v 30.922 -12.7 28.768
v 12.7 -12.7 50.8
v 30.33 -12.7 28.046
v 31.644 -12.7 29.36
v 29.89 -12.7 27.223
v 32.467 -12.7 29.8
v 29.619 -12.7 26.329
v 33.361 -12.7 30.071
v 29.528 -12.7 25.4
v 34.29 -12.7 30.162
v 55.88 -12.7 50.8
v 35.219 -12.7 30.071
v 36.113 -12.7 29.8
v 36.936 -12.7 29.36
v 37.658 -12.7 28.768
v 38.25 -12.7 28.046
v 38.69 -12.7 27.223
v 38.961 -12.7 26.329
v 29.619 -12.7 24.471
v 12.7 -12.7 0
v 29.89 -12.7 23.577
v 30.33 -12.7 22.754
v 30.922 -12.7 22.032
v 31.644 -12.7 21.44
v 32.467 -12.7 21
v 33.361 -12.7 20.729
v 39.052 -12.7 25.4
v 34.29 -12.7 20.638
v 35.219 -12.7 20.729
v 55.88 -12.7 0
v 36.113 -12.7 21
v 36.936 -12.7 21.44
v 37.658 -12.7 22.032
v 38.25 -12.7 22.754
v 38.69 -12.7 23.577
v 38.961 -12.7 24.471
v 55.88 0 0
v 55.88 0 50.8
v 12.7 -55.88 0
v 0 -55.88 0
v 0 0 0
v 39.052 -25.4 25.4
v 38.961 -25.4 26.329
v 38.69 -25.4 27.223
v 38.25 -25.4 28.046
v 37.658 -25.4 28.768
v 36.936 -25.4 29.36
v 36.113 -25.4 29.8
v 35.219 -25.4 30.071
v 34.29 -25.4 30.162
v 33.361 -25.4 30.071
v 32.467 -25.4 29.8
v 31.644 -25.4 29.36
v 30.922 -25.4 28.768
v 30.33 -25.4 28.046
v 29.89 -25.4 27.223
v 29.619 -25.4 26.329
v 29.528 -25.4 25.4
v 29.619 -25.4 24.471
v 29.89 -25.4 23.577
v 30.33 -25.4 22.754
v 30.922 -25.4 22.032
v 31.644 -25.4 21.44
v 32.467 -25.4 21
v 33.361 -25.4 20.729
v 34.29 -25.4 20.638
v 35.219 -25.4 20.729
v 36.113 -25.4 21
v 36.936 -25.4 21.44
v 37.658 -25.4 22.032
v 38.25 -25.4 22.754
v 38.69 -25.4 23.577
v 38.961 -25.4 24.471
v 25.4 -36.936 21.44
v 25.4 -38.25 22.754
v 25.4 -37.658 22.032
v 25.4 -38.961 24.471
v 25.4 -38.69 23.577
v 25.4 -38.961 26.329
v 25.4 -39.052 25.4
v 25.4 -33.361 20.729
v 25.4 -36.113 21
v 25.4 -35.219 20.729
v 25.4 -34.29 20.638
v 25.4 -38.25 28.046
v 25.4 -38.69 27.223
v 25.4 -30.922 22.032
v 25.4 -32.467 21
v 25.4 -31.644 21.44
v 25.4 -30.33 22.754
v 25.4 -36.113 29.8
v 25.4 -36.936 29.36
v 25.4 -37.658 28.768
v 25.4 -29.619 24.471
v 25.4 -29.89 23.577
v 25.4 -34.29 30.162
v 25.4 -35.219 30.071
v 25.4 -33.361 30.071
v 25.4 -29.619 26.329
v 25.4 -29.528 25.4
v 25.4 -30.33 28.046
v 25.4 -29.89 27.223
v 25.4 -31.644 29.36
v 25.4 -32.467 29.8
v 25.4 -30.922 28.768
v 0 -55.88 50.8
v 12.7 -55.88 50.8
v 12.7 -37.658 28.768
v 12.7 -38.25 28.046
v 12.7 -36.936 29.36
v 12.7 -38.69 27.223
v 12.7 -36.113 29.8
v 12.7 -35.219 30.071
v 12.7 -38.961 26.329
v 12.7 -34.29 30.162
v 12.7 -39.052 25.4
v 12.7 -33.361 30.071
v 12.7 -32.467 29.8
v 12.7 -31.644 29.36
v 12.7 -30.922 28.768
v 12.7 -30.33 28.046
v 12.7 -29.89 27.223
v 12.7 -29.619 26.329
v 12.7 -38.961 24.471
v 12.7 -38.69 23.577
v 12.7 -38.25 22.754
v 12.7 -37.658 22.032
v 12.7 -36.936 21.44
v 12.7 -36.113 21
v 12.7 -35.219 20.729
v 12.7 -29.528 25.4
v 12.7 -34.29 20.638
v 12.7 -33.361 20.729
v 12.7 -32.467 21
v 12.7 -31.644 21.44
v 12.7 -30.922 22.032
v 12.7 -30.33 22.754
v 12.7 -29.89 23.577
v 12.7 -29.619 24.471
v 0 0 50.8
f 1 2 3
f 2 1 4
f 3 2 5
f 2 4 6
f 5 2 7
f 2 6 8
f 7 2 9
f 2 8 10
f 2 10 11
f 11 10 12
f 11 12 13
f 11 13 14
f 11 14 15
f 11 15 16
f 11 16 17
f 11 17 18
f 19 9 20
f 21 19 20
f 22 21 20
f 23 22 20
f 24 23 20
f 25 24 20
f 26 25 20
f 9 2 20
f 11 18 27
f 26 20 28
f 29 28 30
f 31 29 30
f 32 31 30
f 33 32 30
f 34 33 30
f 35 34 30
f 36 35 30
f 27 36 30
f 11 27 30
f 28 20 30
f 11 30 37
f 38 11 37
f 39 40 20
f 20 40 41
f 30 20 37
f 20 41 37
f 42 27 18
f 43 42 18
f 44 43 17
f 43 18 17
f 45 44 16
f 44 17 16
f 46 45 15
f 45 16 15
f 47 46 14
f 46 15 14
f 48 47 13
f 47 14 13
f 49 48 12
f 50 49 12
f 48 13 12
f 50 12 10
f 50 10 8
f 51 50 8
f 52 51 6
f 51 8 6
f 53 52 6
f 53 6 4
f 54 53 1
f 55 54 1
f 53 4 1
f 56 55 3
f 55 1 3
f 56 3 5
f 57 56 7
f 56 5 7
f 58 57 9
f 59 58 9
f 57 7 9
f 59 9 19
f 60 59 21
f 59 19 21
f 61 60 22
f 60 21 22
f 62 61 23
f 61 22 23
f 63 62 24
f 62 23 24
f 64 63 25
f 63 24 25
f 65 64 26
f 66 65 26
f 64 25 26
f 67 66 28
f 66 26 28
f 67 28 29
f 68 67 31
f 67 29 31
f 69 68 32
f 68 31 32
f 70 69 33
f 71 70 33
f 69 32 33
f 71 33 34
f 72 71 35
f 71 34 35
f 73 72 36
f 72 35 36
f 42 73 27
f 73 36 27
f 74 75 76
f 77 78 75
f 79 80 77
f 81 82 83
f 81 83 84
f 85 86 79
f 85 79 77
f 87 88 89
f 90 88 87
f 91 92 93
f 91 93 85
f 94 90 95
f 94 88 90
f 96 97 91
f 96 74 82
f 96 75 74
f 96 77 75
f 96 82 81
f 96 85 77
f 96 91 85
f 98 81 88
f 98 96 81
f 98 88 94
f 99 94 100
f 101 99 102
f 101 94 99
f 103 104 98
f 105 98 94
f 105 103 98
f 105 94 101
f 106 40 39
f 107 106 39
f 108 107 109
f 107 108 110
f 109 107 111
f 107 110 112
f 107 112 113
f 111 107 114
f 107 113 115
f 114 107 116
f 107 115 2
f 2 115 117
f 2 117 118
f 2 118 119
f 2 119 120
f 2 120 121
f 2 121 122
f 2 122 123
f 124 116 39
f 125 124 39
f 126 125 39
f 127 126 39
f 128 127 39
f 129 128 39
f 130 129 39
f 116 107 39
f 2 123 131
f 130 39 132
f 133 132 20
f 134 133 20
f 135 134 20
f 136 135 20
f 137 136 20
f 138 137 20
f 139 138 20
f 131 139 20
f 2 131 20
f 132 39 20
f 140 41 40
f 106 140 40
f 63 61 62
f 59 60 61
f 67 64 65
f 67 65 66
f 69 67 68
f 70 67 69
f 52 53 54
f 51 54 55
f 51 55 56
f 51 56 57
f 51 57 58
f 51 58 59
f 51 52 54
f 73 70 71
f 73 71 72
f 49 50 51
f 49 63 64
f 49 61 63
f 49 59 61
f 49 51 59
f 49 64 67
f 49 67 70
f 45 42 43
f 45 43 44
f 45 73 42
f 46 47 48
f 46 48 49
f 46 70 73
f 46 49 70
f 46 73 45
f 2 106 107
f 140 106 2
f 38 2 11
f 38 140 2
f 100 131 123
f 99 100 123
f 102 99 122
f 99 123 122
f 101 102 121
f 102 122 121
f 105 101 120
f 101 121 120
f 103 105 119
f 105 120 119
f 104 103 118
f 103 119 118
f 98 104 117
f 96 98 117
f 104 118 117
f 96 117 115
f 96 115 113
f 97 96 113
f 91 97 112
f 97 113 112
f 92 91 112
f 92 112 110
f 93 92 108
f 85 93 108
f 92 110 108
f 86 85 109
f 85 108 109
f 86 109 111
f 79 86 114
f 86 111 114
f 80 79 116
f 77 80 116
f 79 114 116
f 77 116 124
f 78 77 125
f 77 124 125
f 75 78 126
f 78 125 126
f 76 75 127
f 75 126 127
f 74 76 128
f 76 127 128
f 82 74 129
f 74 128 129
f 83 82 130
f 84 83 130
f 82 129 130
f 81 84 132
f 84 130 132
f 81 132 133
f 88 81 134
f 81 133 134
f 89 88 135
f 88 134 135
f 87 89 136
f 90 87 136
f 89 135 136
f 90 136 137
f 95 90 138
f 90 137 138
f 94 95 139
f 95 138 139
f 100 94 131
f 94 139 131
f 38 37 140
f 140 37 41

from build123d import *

# Parameters (mm, degrees)
F0_W     = 12.7
F0_H     = 21.59
F0_W_2   = 21.59
F0_H_2   = 12.7
F1_DEPTH = 50.8
F2_R     = 4.7625
F3_DEPTH = 12.7
F4_R     = 4.7625
F5_DEPTH = 12.7


with BuildPart() as f1:
    # F0 (on Top) → F1 (new body)
    with BuildSketch(Plane.XY):
        Polygon((34.29, 0), (0, 0), (0, -34.29), (12.7, -34.29), (12.7, -12.7), (34.29, -12.7), align=None)
        with Locations((6.35, -45.085)):
            Rectangle(F0_W, F0_H)
        with Locations((45.085, -6.35)):
            Rectangle(F0_W_2, F0_H_2)
    extrude(amount=F1_DEPTH)

    # F2 (on face) → F3 (join)
    with BuildSketch(Plane.XZ.offset(12.7)):
        with Locations((34.29, 25.4)):
            Circle(F2_R)
    extrude(amount=F3_DEPTH)

    # F4 (on face) → F5 (join)
    with BuildSketch(Plane.YZ.offset(12.7)):
        with Locations((-34.29, 25.4)):
            Circle(F4_R)
    extrude(amount=F5_DEPTH)


solid = f1.part
